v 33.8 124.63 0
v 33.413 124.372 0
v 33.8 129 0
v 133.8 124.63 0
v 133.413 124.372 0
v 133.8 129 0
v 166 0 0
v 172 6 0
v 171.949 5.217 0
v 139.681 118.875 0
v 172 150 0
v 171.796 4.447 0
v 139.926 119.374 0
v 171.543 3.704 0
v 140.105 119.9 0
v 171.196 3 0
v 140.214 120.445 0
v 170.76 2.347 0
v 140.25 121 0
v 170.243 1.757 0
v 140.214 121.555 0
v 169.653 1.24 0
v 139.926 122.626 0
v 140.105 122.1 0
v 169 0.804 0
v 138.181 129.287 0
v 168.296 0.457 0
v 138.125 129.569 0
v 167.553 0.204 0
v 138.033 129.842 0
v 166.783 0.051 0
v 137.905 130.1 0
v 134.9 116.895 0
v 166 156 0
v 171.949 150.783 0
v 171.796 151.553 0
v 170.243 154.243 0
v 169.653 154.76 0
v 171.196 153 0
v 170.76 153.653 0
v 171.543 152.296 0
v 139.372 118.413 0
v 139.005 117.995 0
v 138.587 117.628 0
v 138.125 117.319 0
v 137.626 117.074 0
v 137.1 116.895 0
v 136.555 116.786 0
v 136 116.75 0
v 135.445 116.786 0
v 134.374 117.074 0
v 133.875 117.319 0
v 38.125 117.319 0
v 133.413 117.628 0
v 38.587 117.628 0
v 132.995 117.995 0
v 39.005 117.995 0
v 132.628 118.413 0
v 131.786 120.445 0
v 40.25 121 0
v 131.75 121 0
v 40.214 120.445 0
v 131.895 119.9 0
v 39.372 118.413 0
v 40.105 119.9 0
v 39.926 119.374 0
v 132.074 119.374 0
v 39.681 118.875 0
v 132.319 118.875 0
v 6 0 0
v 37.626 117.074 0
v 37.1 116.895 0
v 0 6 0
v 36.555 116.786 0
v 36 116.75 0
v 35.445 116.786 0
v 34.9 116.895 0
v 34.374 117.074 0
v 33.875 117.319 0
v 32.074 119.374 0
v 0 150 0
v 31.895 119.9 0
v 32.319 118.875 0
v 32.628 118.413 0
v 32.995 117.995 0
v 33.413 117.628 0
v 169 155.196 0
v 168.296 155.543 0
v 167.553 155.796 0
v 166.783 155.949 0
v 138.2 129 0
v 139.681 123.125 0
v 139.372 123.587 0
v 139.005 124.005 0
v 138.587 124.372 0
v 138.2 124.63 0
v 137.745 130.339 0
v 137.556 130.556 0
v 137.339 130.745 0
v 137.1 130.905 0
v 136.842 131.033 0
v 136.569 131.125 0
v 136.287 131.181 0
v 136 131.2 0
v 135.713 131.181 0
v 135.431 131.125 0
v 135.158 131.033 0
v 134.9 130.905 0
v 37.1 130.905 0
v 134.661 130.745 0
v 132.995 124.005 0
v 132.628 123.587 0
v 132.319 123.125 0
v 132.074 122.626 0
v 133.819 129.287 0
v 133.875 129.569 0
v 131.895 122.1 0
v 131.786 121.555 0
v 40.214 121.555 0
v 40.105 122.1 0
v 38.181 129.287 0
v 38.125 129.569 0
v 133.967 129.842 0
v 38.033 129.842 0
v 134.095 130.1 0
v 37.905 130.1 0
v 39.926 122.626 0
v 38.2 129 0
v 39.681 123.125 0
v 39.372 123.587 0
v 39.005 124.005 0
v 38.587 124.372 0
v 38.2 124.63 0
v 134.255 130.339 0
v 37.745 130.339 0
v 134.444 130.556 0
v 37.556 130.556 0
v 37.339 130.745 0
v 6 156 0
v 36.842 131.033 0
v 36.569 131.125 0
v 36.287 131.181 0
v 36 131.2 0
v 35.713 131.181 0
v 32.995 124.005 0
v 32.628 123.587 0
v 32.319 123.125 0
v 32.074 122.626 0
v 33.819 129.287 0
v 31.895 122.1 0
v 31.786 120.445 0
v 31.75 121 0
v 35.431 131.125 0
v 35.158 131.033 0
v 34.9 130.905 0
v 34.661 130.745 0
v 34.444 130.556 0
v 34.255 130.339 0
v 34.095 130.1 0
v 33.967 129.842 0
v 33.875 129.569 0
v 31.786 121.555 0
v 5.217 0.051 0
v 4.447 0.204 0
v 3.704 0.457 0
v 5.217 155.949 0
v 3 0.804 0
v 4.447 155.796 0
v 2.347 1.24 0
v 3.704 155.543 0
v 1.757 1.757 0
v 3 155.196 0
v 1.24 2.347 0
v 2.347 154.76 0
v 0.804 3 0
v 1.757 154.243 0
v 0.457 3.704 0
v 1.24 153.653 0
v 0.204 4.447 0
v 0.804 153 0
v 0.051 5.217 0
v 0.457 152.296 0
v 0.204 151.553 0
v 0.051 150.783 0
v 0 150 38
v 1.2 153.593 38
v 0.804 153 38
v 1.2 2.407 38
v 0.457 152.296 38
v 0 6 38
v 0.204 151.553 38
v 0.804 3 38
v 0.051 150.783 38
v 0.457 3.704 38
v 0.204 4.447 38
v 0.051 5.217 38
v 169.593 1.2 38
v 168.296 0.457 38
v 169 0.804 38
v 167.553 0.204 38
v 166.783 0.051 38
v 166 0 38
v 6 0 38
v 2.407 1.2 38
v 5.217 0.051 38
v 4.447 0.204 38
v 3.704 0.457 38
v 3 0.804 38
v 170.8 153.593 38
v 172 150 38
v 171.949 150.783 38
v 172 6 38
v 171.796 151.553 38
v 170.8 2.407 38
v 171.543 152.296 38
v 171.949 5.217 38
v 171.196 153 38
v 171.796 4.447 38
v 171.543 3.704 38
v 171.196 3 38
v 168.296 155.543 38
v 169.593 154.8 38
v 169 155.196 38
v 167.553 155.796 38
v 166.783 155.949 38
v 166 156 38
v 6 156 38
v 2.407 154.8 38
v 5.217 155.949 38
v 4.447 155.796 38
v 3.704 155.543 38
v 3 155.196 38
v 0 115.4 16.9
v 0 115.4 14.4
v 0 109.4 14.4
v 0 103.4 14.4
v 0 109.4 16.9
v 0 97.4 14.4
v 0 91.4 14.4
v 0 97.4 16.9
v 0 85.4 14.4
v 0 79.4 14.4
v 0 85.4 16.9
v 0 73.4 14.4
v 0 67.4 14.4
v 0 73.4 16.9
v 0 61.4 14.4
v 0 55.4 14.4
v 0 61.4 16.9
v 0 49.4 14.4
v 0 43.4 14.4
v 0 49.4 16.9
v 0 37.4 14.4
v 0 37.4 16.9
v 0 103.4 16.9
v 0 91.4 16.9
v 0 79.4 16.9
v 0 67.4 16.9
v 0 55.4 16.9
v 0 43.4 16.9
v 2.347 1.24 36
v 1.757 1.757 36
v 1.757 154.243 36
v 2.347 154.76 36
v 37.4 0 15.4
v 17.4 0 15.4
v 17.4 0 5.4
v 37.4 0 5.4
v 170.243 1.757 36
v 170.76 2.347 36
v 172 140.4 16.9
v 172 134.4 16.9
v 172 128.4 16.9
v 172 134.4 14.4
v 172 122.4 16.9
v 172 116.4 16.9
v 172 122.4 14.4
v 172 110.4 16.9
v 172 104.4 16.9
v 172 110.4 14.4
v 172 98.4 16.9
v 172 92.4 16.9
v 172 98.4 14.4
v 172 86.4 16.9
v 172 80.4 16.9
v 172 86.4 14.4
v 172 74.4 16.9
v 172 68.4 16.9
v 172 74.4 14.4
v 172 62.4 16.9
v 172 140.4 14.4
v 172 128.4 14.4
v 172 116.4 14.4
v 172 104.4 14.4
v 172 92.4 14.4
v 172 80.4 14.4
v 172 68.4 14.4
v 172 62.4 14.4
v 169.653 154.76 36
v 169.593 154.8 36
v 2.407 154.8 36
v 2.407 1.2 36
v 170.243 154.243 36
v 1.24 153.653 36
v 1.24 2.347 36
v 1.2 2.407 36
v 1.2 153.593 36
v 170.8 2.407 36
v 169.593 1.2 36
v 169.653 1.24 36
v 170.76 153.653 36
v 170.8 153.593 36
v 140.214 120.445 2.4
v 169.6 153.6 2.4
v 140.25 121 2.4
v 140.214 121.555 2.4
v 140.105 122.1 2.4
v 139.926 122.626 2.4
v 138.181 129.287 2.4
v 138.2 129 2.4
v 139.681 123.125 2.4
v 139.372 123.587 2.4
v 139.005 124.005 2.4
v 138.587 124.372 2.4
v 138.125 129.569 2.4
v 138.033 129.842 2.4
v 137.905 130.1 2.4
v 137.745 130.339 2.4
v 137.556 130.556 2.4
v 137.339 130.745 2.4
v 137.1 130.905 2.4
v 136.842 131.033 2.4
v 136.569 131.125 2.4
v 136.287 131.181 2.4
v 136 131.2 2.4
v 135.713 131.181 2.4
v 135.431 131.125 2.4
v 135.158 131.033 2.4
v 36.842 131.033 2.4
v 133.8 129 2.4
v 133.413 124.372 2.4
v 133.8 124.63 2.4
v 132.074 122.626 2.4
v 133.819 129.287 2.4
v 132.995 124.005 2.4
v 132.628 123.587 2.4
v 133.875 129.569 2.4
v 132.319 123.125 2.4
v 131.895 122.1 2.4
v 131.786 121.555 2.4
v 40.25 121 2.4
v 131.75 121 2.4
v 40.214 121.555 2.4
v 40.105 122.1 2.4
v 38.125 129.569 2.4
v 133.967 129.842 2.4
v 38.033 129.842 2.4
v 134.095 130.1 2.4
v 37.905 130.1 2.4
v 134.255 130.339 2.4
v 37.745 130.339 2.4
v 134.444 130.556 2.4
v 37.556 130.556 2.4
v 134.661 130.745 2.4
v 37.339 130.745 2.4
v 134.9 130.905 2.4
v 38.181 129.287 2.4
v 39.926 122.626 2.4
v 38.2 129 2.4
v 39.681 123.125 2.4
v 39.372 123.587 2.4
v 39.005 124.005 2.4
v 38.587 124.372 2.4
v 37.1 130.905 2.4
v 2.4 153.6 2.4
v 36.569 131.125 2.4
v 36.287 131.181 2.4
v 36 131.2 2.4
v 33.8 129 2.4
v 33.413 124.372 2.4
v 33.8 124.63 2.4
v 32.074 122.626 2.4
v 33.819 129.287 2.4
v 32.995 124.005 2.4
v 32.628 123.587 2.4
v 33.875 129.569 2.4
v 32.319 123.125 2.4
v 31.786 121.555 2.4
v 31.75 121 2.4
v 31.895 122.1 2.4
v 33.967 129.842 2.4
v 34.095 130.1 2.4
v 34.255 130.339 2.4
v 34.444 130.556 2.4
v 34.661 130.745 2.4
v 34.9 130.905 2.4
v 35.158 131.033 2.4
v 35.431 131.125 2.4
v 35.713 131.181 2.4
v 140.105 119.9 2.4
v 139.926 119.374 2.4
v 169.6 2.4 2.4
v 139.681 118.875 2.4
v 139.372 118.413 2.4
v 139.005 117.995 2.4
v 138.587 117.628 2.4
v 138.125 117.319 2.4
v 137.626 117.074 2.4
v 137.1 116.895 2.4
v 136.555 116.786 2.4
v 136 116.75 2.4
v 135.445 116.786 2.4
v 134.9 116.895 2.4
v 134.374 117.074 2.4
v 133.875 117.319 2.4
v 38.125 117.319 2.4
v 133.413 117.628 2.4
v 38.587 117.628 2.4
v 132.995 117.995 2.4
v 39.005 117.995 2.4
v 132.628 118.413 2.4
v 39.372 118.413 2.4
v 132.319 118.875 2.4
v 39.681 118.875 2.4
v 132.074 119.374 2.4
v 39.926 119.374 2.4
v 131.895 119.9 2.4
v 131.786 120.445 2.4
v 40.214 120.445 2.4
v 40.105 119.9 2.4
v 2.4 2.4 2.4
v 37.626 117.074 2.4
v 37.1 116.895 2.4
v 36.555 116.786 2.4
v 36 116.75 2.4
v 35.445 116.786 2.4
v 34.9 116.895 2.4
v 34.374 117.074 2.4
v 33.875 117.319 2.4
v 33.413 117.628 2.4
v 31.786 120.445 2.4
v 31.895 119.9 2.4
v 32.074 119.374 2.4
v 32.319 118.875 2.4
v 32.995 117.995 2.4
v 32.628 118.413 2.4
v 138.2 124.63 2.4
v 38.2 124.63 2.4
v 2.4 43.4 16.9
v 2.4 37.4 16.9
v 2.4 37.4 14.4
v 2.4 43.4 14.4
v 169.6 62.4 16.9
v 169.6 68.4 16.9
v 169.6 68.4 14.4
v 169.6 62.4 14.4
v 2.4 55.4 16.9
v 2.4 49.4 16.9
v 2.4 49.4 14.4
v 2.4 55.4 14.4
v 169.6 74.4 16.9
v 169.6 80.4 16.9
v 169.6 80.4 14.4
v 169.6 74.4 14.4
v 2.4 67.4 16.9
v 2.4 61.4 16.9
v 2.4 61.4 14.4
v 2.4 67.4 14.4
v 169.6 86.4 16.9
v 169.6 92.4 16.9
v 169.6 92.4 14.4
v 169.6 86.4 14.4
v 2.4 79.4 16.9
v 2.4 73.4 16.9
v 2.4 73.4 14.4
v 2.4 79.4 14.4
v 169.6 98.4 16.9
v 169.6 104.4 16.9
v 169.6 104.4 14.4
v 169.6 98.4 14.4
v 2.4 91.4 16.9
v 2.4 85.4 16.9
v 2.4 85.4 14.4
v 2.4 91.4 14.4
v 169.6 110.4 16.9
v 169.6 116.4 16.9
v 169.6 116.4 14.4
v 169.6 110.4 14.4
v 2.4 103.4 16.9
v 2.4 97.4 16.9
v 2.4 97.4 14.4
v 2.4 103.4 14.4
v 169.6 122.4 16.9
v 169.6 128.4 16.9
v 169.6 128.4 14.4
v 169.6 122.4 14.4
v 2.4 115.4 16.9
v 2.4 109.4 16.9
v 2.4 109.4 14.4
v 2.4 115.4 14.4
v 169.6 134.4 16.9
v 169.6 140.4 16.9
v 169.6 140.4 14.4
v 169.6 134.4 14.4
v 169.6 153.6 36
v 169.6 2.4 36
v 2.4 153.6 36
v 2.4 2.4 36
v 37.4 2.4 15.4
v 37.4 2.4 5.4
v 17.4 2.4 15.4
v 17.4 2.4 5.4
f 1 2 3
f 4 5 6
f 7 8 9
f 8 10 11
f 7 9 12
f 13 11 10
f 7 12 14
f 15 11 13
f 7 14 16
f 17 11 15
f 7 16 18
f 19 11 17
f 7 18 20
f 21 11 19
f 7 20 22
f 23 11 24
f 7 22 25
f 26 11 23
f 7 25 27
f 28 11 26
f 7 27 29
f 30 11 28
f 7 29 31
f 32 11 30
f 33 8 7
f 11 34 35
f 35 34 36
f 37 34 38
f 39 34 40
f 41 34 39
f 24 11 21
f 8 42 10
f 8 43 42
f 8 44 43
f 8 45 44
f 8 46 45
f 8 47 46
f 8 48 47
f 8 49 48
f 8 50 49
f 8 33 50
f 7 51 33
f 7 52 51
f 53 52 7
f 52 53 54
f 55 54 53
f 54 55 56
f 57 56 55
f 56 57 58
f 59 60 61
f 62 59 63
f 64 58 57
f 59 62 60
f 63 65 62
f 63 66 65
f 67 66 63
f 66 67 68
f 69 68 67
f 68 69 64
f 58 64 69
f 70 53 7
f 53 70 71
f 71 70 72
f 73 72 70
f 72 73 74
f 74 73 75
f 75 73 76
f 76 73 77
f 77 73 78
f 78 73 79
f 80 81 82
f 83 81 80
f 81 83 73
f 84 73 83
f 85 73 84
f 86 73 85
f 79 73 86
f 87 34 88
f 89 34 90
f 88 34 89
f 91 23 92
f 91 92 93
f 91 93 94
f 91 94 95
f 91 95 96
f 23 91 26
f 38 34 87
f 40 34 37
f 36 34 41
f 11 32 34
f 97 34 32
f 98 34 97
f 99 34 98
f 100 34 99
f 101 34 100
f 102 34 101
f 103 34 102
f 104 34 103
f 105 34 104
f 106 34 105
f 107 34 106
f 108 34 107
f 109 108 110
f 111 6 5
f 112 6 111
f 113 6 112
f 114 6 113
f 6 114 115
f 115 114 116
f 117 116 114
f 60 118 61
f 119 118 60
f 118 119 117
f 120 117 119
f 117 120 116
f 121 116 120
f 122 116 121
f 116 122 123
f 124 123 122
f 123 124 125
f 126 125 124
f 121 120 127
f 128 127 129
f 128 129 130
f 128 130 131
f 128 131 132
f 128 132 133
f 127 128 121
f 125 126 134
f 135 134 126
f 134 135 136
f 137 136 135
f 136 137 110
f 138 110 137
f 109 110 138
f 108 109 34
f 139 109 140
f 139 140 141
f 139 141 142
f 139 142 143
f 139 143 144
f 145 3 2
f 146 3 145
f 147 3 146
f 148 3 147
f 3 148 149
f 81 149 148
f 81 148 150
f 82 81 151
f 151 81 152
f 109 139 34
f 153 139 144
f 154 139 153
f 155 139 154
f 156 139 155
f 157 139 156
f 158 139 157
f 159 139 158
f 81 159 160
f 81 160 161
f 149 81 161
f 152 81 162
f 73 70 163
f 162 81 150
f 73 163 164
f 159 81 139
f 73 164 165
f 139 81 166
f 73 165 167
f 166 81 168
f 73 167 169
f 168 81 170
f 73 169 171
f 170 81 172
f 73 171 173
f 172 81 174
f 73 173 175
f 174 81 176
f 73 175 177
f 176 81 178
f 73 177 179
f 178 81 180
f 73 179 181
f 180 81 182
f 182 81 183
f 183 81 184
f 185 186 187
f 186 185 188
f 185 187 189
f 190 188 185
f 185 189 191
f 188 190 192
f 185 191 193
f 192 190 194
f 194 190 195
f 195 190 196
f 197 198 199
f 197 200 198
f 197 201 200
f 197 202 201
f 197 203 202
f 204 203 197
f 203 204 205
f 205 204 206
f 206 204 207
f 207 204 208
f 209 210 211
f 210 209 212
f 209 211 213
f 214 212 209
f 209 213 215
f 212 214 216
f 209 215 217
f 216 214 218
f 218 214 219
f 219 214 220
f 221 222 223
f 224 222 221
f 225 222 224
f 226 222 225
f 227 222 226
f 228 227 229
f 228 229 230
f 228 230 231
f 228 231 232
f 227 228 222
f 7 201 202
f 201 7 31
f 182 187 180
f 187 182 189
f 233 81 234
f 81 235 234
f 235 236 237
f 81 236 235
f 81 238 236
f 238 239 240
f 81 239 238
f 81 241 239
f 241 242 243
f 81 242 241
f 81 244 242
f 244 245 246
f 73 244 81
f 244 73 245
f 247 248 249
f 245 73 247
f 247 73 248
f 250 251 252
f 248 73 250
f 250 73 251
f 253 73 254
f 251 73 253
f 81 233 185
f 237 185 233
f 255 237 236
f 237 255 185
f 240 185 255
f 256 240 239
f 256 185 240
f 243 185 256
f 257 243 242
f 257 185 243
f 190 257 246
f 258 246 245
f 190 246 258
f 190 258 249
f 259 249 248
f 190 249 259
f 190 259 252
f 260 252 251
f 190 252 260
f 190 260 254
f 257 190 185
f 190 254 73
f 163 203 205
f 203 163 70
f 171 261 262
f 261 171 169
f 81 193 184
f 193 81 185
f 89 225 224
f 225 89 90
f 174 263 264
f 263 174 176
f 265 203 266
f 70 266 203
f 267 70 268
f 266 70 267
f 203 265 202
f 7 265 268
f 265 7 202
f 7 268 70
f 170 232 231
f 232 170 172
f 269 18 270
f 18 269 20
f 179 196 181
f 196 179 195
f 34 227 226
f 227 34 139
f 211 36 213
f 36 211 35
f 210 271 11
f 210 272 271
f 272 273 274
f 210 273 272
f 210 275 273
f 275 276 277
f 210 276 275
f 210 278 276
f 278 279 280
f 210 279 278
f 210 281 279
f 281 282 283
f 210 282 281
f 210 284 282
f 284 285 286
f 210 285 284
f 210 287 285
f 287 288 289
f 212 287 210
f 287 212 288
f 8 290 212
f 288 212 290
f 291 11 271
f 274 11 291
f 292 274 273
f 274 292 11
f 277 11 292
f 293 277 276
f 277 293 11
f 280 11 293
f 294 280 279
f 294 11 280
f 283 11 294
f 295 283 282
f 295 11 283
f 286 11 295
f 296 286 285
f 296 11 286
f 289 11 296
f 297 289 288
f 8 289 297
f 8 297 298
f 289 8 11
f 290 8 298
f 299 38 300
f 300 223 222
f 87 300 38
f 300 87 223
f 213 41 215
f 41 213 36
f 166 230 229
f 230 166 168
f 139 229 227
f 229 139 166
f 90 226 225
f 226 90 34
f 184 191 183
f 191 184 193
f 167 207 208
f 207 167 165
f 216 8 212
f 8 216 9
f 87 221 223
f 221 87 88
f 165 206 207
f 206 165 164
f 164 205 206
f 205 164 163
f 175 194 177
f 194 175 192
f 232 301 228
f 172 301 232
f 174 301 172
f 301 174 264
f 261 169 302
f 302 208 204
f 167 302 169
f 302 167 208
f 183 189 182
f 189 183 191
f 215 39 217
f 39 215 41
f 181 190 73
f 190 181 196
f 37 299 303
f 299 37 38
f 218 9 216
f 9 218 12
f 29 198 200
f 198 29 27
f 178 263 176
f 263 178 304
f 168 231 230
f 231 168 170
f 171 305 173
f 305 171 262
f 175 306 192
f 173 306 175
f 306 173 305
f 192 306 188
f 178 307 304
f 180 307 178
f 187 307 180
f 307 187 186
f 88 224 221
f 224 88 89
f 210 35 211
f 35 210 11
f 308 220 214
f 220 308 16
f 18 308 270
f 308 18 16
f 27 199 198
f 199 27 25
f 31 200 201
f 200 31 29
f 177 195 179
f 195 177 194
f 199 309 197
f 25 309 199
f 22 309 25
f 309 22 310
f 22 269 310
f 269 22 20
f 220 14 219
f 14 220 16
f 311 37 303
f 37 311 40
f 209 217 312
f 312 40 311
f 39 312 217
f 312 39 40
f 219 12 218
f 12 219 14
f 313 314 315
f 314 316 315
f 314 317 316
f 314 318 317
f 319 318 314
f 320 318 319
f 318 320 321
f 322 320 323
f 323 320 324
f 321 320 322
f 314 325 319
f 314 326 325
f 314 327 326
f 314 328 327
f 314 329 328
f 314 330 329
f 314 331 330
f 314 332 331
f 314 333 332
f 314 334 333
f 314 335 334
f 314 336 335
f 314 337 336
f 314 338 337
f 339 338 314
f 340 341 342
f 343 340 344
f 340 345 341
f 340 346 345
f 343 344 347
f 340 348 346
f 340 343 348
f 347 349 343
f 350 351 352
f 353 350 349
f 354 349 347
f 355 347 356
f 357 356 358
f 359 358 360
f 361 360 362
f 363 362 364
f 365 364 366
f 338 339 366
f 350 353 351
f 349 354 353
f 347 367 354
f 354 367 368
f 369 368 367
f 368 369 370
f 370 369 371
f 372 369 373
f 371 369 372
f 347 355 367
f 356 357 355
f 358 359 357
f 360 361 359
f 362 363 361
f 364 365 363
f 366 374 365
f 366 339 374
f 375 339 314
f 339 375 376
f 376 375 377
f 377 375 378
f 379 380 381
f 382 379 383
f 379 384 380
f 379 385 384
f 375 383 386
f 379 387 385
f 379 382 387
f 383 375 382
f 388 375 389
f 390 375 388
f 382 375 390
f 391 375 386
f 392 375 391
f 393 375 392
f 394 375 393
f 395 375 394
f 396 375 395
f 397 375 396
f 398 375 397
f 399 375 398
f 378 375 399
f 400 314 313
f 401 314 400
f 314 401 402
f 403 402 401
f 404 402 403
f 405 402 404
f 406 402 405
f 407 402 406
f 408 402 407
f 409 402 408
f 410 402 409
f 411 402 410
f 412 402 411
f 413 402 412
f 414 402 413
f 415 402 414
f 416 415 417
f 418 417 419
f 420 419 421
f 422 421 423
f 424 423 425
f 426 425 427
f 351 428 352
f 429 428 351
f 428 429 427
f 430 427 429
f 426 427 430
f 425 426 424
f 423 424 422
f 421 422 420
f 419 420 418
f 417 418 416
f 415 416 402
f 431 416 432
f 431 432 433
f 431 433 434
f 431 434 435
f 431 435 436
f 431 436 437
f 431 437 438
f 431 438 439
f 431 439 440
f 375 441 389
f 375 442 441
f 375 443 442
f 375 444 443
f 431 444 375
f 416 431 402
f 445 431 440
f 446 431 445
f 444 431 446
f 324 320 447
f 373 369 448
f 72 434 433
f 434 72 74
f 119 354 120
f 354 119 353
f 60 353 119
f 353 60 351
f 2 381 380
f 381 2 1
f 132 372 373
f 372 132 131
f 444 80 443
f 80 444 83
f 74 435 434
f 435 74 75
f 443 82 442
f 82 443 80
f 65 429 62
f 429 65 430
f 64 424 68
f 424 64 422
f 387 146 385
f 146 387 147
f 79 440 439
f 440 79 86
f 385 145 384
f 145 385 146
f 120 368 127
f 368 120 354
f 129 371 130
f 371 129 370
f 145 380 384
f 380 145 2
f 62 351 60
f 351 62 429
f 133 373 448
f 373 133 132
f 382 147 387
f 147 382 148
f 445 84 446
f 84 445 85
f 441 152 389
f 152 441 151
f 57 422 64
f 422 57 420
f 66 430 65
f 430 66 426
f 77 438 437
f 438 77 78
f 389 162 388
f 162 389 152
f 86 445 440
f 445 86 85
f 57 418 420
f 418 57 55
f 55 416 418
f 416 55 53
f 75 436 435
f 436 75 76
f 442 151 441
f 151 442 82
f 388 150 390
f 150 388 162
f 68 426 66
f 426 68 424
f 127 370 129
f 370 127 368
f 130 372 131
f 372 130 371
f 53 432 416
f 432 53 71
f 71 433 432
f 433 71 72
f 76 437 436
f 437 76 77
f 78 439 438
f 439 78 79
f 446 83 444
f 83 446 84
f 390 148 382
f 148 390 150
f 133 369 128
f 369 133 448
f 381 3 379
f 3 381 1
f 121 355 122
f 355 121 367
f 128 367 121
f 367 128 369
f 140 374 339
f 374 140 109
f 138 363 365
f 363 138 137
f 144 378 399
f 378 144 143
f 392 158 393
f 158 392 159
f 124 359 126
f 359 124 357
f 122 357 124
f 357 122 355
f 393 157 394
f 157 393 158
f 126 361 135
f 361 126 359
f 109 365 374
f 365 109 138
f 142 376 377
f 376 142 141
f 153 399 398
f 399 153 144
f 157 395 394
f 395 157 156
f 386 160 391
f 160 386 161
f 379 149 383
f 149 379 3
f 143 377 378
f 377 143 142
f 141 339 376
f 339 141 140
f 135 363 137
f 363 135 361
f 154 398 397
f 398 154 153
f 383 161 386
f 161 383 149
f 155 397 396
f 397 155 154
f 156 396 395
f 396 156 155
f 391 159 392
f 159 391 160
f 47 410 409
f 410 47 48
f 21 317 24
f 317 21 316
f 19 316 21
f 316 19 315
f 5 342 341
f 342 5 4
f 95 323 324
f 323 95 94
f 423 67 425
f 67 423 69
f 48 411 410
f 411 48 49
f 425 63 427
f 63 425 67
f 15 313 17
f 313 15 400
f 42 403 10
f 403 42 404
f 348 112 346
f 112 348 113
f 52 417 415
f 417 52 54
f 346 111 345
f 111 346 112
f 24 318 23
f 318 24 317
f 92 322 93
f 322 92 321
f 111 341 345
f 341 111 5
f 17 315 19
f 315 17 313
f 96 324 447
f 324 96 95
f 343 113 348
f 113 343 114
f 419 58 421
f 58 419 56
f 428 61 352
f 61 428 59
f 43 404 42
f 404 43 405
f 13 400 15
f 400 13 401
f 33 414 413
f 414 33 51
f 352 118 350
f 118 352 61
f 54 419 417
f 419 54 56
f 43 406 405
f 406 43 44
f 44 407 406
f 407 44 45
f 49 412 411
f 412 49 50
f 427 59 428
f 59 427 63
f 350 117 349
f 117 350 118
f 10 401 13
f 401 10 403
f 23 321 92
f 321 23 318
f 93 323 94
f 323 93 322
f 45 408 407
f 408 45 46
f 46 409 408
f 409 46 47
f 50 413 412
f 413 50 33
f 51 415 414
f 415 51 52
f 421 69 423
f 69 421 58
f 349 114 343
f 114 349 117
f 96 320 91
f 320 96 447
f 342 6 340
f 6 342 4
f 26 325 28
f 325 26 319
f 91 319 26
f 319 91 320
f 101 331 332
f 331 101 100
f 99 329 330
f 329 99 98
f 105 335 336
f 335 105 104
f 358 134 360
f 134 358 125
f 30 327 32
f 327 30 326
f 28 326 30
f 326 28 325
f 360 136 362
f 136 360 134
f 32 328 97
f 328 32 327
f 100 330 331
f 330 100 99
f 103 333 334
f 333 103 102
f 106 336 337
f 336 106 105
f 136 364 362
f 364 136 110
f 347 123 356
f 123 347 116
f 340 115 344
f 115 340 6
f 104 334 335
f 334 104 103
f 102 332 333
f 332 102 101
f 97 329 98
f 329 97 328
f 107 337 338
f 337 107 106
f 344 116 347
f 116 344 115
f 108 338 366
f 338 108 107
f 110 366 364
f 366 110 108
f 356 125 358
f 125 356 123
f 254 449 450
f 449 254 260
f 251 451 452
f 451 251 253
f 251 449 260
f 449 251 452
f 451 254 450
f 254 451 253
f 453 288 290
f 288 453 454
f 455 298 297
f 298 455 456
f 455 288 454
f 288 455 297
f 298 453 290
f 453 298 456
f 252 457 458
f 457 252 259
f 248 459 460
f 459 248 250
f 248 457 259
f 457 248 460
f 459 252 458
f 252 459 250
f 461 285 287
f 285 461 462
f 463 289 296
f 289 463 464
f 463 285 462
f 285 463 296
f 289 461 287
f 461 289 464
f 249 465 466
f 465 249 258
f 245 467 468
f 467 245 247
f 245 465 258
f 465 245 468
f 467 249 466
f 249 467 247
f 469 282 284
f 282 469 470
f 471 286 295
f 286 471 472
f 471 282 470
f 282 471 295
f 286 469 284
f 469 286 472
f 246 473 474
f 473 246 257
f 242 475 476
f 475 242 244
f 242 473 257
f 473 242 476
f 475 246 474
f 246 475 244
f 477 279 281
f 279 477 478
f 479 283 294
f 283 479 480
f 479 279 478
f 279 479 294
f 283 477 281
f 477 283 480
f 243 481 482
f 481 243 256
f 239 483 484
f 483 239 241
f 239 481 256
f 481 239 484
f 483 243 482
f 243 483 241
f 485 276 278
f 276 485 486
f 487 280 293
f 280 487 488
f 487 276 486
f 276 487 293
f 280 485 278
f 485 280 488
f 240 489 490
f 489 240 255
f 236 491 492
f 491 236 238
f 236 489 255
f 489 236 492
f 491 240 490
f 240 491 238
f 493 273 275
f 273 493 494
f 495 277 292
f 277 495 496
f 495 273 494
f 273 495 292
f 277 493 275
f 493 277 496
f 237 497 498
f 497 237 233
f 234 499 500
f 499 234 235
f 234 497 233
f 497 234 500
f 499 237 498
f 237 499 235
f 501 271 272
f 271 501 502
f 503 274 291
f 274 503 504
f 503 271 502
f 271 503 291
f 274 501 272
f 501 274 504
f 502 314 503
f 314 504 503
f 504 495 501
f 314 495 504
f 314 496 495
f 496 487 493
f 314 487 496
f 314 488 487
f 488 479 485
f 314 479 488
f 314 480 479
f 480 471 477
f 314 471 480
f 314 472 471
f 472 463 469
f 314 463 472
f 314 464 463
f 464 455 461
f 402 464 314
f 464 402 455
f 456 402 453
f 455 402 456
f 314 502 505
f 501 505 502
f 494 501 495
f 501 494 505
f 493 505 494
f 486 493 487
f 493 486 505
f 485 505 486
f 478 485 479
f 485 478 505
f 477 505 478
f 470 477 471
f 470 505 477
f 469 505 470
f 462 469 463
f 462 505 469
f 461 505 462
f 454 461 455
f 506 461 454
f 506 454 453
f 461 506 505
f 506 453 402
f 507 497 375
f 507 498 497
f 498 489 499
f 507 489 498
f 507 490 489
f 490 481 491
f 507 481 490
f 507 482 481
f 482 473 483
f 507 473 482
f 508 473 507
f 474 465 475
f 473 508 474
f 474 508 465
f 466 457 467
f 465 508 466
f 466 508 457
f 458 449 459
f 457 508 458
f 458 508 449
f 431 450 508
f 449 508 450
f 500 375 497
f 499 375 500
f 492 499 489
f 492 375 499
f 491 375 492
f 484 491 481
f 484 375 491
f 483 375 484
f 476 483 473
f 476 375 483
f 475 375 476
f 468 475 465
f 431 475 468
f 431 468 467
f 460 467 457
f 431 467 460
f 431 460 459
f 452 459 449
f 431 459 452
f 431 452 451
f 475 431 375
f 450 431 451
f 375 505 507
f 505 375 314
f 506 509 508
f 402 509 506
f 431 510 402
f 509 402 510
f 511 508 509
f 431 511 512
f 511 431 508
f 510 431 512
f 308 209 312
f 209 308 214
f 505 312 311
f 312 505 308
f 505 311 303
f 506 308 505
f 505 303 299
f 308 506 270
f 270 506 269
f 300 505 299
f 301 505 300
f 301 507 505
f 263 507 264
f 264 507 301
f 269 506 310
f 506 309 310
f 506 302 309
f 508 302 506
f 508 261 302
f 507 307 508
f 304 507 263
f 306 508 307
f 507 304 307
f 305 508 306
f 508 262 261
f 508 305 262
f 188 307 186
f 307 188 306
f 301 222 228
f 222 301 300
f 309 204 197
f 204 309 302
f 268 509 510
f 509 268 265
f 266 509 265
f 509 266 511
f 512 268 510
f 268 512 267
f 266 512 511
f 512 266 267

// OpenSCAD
// file: config.scad
// ============================================================================
// PROJECT  : Guava Home — ESP32 Smart Home Controller Enclosure
// FILE     : config.scad
// PRINTER  : Bambu Lab A1 Mini (180 × 180 × 180 mm build envelope)
// TARGET   : ESP32 38-Pin DevKit + Purple Breakout + 16x2 I2C LCD + RC522 RFID
//            + 10,000 mAh Powerbank + Dual Buttons + External Relay/Sensor I/O
// ============================================================================

$fn = 48; // Smooth curves for 3D printing

// ----------------------------------------------------------------------------
// 1. 3D PRINTER BED ENVELOPE (BAMBU LAB A1 MINI)
// ----------------------------------------------------------------------------
BED_X = 180.0;
BED_Y = 180.0;
BED_Z = 180.0;

// ----------------------------------------------------------------------------
// 2. ENCLOSURE OUTER DIMENSIONS & WALL THICKNESSES
// ----------------------------------------------------------------------------
BOX_W   = 172.0; // Outer Width (X)  - leaves 4.0 mm margin on each side for brim
BOX_D   = 156.0; // Outer Depth (Y)  - leaves 12.0 mm margin on each side
BASE_H  = 38.0;  // Base Housing Height (Z)
LID_H   = 5.0;   // Lid Plate Thickness (Z)
TOTAL_H = BASE_H + LID_H; // 43.0 mm total height (generous DuPont wire arch headroom)

WALL_T  = 2.4;   // 6 perimeters @ 0.4mm nozzle (ultra rigid shell)
FLOOR_T = 2.4;   // 12 solid bottom layers @ 0.2mm layer height
CORNER_R = 6.0;  // Outer corner radius for aesthetics & strength

LIP_OFFSET = 1.2; // Step width for interlocking tongue-and-groove lip
LIP_HEIGHT = 2.0; // Step height of mating perimeter rim
LIP_TOL    = 0.25;// Slicing fit clearance

// Bed fit assertions
assert(BOX_W <= BED_X, "ERROR: BOX_W exceeds Bambu Lab A1 Mini build plate (180mm)!");
assert(BOX_D <= BED_Y, "ERROR: BOX_D exceeds Bambu Lab A1 Mini build plate (180mm)!");
assert(TOTAL_H <= BED_Z, "ERROR: TOTAL_H exceeds Bambu Lab A1 Mini height!");

// Interior Dimensions
INT_W = BOX_W - (2 * WALL_T); // 167.2 mm
INT_D = BOX_D - (2 * WALL_T); // 151.2 mm
INT_H = BASE_H - FLOOR_T;    // 35.6 mm interior clearance

// ----------------------------------------------------------------------------
// 3. INTERNAL PARTITION: POWERBANK & CONTROLLER BAYS
// ----------------------------------------------------------------------------
// Left Bay: 10,000 mAh Powerbank (Standard slim envelope: ~146 x 71 x 16.5 mm)
PB_BAY_W     = 72.0;  // Clear width for 10,000 mAh power bank
DIVIDER_W    = 2.0;   // Thickness of internal partition wall
DIVIDER_H    = 22.0;  // Height of partition (leaves 13.6 mm top gap for cable routing)
DIVIDER_X    = WALL_T + PB_BAY_W; // X position of divider

// Right Bay: ESP32 Purple Breakout Board + Sensor Cable Routing
CONTROLLER_BAY_W = INT_W - PB_BAY_W - DIVIDER_W; // 93.2 mm

// ----------------------------------------------------------------------------
// 4. ESP32 38-PIN PURPLE EXPANSION BOARD STANDOFFS
// ----------------------------------------------------------------------------
ESP_PCB_W         = 63.0; // Expansion board width (X)
ESP_PCB_L         = 78.0; // Expansion board length (Y)
ESP_HOLE_DX       = 57.0; // Center-to-center hole pitch in X
ESP_HOLE_DY       = 72.0; // Center-to-center hole pitch in Y
ESP_STANDOFF_H    = 5.0;  // Standoff height above floor (prevents pin shorts, air gap)
ESP_STANDOFF_OD   = 7.0;  // Outer standoff boss diameter
ESP_SCREW_PILOT_D = 2.8;  // M3 self-tapping screw pilot hole (or M3 heat-set insert)

// Position of ESP32 board in Right Bay (centered horizontally & positioned lower)
ESP_POS_X = DIVIDER_X + DIVIDER_W + ((CONTROLLER_BAY_W - ESP_PCB_W) / 2);
ESP_POS_Y = WALL_T + 12.0;

// ----------------------------------------------------------------------------
// 5. 16x2 I2C LCD DISPLAY SPECIFICATIONS (FRONT LID MOUNT)
// ----------------------------------------------------------------------------
LCD_PCB_W     = 80.0;
LCD_PCB_H     = 36.0;
LCD_BEZEL_W   = 72.0; // Metal bezel cutout width
LCD_BEZEL_H   = 25.0; // Metal bezel cutout height
LCD_HOLE_DX   = 75.0; // 4x mounting holes pitch X
LCD_HOLE_DY   = 31.0; // 4x mounting holes pitch Y
LCD_BOSS_H    = 5.0;  // Standoff height on inside of lid
LCD_BOSS_OD   = 6.5;
LCD_PILOT_D   = 2.6;  // M2.5 / M3 screw pilot hole

// LCD location on Front Plate (Upper-Left portion)
LCD_POS_X = WALL_T + 10.0;
LCD_POS_Y = BOX_D - WALL_T - LCD_PCB_H - 10.0; // Y = 105.6 mm

// ----------------------------------------------------------------------------
// 6. RC522 RFID READER SPECIFICATIONS (FRONT LID MOUNT)
// ----------------------------------------------------------------------------
RFID_PCB_W       = 40.5;
RFID_PCB_L       = 60.5;
RFID_HOLE_DX     = 34.0;
RFID_HOLE_DY     = 54.0;
RFID_POCKET_D    = 3.2;  // Depth of pocket recessed from inside of lid
RFID_FACE_T      = 1.2;  // Plastic thickness remaining on front face (high RF coupling)
RFID_BOSS_H      = 4.5;
RFID_BOSS_OD     = 6.0;
RFID_PILOT_D     = 2.6;

// RFID reader location on Front Plate (Upper-Right portion)
RFID_POS_X = BOX_W - WALL_T - RFID_PCB_W - 14.0;
RFID_POS_Y = BOX_D - WALL_T - RFID_PCB_L - 8.0;

// ----------------------------------------------------------------------------
// 7. USER CONTROLS & ACOUSTIC PORTS (FRONT LID)
// ----------------------------------------------------------------------------
// 2x Tactile Pushbuttons: BTN1 (Exit/Unlock), BTN2 (Page Switch)
BTN_HOLE_D     = 8.2;  // Hole for button plunger
BTN_SPACING_X  = 26.0; // Distance between buttons
BTN1_X         = LCD_POS_X + 18.0;
BTN2_X         = BTN1_X + BTN_SPACING_X;
BTN_Y          = LCD_POS_Y - 26.0;

// Active Buzzer Acoustic Vent Grid
BUZZER_VENT_D  = 1.8;  // Individual acoustic hole diameter
BUZZER_VENT_P  = 3.6;  // Pitch between holes (3x3 grid)
BUZZER_POS_X   = RFID_POS_X + (RFID_PCB_W / 2);
BUZZER_POS_Y   = BTN_Y;

// ----------------------------------------------------------------------------
// 8. CABLE EXIT PORTS & PASS-THROUGHS (EXTERNAL SENSORS & RELAYS)
// ----------------------------------------------------------------------------
// Port 1: Bottom wall right side (for external relays, soil, rain, DHT sensors)
CABLE_PORT_W   = 28.0;
CABLE_PORT_H   = 10.0;
CABLE_PORT_R   = 3.0;  // Radiused corner to prevent wire chafing

// Port 2: Right side wall (for ultrasonic / door IR wires)
SIDE_PORT_W    = 22.0;
SIDE_PORT_H    = 10.0;

// Internal Cable Tie Strain Relief Slots (for 2.5mm zip-ties)
ZIP_SLOT_W     = 4.0;
ZIP_SLOT_H     = 1.8;

// ----------------------------------------------------------------------------
// 9. CORNER SCREW BOSSES (FASTEN LID TO BASE)
// ----------------------------------------------------------------------------
CORNER_BOSS_OD      = 9.0;
CORNER_PILOT_D      = 2.8; // M3 self-tap or heat-set insert pilot (15mm deep)
CORNER_HOLE_MARGIN  = 7.0; // Distance from outer shell edge
CORNER_SCREW_CLR_D  = 3.4; // Clearance hole in lid for M3 screw
CORNER_COUNTERSINK_D= 6.5; // 90° countersunk screw head diameter

// ----------------------------------------------------------------------------
// 10. WALL MOUNTING KEYHOLES (REAR FLOOR)
// ----------------------------------------------------------------------------
KEYHOLE_SPACING_X = 100.0; // Standard 100mm horizontal hole pitch
KEYHOLE_ENTRY_D   = 8.5;   // Large hole diameter for screw head
KEYHOLE_SLOT_W    = 4.4;   // Narrow slot width for screw shaft (M3.5 / M4)
KEYHOLE_SLOT_L    = 8.0;   // Upward slide length
KEYHOLE_POS_Y     = BOX_D - 35.0; // Positioned high on back plate for stable hang

// ============================================================================
// HELPER MODULES
// ============================================================================
module rounded_rect(w, d, h, r) {
    linear_extrude(height = h) {
        offset(r = r) {
            square([w - (2 * r), d - (2 * r)], center = true);
        }
    }
}
// main file
// ============================================================================
// PROJECT  : Guava Home — ESP32 Smart Home Controller Enclosure
// FILE     : base_housing.scad
// PURPOSE  : Bottom housing containing powerbank cradle, ESP32 standoffs,
//            wall-mount keyholes, cable exit ports, and strain-relief anchors.
// ============================================================================

include <config.scad>

module base_housing() {
    difference() {
        // --------------------------------------------------------------------
        // 1. MAIN SOLID BODY & INTERNAL BOSSES
        // --------------------------------------------------------------------
        union() {
            // Outer solid shell with rounded corners
            translate([BOX_W / 2, BOX_D / 2, 0])
                rounded_rect(BOX_W, BOX_D, BASE_H, CORNER_R);

            // 4x Corner Screw Bosses (solid columns for screw retention)
            for (cx = [CORNER_HOLE_MARGIN, BOX_W - CORNER_HOLE_MARGIN]) {
                for (cy = [CORNER_HOLE_MARGIN, BOX_D - CORNER_HOLE_MARGIN]) {
                    translate([cx, cy, 0])
                        cylinder(d = CORNER_BOSS_OD, h = BASE_H);
                }
            }

            // Divider Wall separating Powerbank and Controller Bay
            translate([DIVIDER_X, WALL_T, FLOOR_T])
                cube([DIVIDER_W, INT_D, DIVIDER_H]);

            // Standoff Bosses for ESP32 38-Pin Purple Breakout Board
            for (hx = [0, ESP_HOLE_DX]) {
                for (hy = [0, ESP_HOLE_DY]) {
                    translate([ESP_POS_X + ((ESP_PCB_W - ESP_HOLE_DX) / 2) + hx,
                               ESP_POS_Y + ((ESP_PCB_L - ESP_HOLE_DY) / 2) + hy,
                               FLOOR_T]) {
                        cylinder(d = ESP_STANDOFF_OD, h = ESP_STANDOFF_H);
                        // Stiffening fillet / gusset to base
                        cylinder(d1 = ESP_STANDOFF_OD + 3.0, d2 = ESP_STANDOFF_OD, h = 2.0);
                    }
                }
            }

            // Zip-tie strain-relief bridges for external sensor/relay cables
            translate([BOX_W - WALL_T - 16.0, WALL_T + 18.0, FLOOR_T])
                cube([10.0, 4.0, 3.5]);
            translate([BOX_W - WALL_T - 16.0, WALL_T + 26.0, FLOOR_T])
                cube([10.0, 4.0, 3.5]);
        }

        // --------------------------------------------------------------------
        // 2. MAIN INTERIOR CAVITY
        // --------------------------------------------------------------------
        translate([WALL_T, WALL_T, FLOOR_T])
            cube([INT_W, INT_D, BASE_H - FLOOR_T + 1.0]);

        // Stepped Mating Lip (Recessed rim for lid alignment)
        translate([WALL_T - LIP_OFFSET, WALL_T - LIP_OFFSET, BASE_H - LIP_HEIGHT])
            cube([INT_W + (2 * LIP_OFFSET), INT_D + (2 * LIP_OFFSET), LIP_HEIGHT + 1.0]);

        // --------------------------------------------------------------------
        // 3. CORNER SCREW PILOT HOLES (M3 SELF-TAPPING)
        // --------------------------------------------------------------------
        for (cx = [CORNER_HOLE_MARGIN, BOX_W - CORNER_HOLE_MARGIN]) {
            for (cy = [CORNER_HOLE_MARGIN, BOX_D - CORNER_HOLE_MARGIN]) {
                translate([cx, cy, BASE_H - 18.0])
                    cylinder(d = CORNER_PILOT_D, h = 19.0);
            }
        }

        // --------------------------------------------------------------------
        // 4. ESP32 STANDOFF PILOT HOLES (M3)
        // --------------------------------------------------------------------
        for (hx = [0, ESP_HOLE_DX]) {
            for (hy = [0, ESP_HOLE_DY]) {
                translate([ESP_POS_X + ((ESP_PCB_W - ESP_HOLE_DX) / 2) + hx,
                           ESP_POS_Y + ((ESP_PCB_L - ESP_HOLE_DY) / 2) + hy,
                           FLOOR_T])
                    cylinder(d = ESP_SCREW_PILOT_D, h = ESP_STANDOFF_H + 2.0);
            }
        }

        // --------------------------------------------------------------------
        // 5. WALL-MOUNT KEYHOLE SLOTS (DUAL 100mm SPACING)
        // --------------------------------------------------------------------
        for (kx = [(BOX_W / 2) - (KEYHOLE_SPACING_X / 2), (BOX_W / 2) + (KEYHOLE_SPACING_X / 2)]) {
            // Large entry hole (for screw head up to 8.5mm)
            translate([kx, KEYHOLE_POS_Y, -0.5])
                cylinder(d = KEYHOLE_ENTRY_D, h = FLOOR_T + 1.0);
            
            // Narrow slot (sliding upwards for M3.5 / M4 screw shank)
            translate([kx - (KEYHOLE_SLOT_W / 2), KEYHOLE_POS_Y, -0.5])
                cube([KEYHOLE_SLOT_W, KEYHOLE_SLOT_L, FLOOR_T + 1.0]);
            
            translate([kx, KEYHOLE_POS_Y + KEYHOLE_SLOT_L, -0.5])
                cylinder(d = KEYHOLE_SLOT_W, h = FLOOR_T + 1.0);
        }

        // --------------------------------------------------------------------
        // 6. CABLE PASS-THROUGHS & EXTERNAL SENSOR I/O PORTS
        // --------------------------------------------------------------------
        // Bottom Cable Exit Port (to external 4x Relays, Mains, Sensors)
        translate([BOX_W - WALL_T - 38.0, -1.0, FLOOR_T + 4.0])
            rounded_rect(CABLE_PORT_W, WALL_T + 2.0, CABLE_PORT_H, CABLE_PORT_R);

        // Right Wall Cable Exit Port (for PIR, HC-SR04, DHT)
        translate([BOX_W - WALL_T - 1.0, WALL_T + 30.0, FLOOR_T + 4.0])
            rotate([0, 0, 90])
                rounded_rect(SIDE_PORT_W, WALL_T + 2.0, SIDE_PORT_H, CABLE_PORT_R);

        // Powerbank to Controller Bay Wire Notch in Divider
        translate([DIVIDER_X - 1.0, WALL_T + 30.0, FLOOR_T + 6.0])
            cube([DIVIDER_W + 2.0, 20.0, DIVIDER_H]);

        // Powerbank USB Access Cutout (on bottom left wall for charging power bank)
        translate([WALL_T + 15.0, -1.0, FLOOR_T + 3.0])
            cube([20.0, WALL_T + 2.0, 10.0]);

        // Zip-tie slots through strain relief bridges
        translate([BOX_W - WALL_T - 13.0, WALL_T + 19.0, FLOOR_T + 1.0])
            cube([4.0, ZIP_SLOT_W, ZIP_SLOT_H]);
        translate([BOX_W - WALL_T - 13.0, WALL_T + 27.0, FLOOR_T + 1.0])
            cube([4.0, ZIP_SLOT_W, ZIP_SLOT_H]);

        // --------------------------------------------------------------------
        // 7. PASSIVE VENTILATION GRILLES (SIDE COOLING)
        // --------------------------------------------------------------------
        for (i = [0:6]) {
            // Left wall vents (near powerbank)
            translate([-1.0, WALL_T + 35.0 + (i * 12.0), FLOOR_T + 12.0])
                cube([WALL_T + 2.0, 6.0, 2.5]);
            
            // Right wall vents (near ESP32)
            translate([BOX_W - WALL_T - 1.0, WALL_T + 60.0 + (i * 12.0), FLOOR_T + 12.0])
                cube([WALL_T + 2.0, 6.0, 2.5]);
        }
    }
}

// Preview when rendered directly
base_housing();
